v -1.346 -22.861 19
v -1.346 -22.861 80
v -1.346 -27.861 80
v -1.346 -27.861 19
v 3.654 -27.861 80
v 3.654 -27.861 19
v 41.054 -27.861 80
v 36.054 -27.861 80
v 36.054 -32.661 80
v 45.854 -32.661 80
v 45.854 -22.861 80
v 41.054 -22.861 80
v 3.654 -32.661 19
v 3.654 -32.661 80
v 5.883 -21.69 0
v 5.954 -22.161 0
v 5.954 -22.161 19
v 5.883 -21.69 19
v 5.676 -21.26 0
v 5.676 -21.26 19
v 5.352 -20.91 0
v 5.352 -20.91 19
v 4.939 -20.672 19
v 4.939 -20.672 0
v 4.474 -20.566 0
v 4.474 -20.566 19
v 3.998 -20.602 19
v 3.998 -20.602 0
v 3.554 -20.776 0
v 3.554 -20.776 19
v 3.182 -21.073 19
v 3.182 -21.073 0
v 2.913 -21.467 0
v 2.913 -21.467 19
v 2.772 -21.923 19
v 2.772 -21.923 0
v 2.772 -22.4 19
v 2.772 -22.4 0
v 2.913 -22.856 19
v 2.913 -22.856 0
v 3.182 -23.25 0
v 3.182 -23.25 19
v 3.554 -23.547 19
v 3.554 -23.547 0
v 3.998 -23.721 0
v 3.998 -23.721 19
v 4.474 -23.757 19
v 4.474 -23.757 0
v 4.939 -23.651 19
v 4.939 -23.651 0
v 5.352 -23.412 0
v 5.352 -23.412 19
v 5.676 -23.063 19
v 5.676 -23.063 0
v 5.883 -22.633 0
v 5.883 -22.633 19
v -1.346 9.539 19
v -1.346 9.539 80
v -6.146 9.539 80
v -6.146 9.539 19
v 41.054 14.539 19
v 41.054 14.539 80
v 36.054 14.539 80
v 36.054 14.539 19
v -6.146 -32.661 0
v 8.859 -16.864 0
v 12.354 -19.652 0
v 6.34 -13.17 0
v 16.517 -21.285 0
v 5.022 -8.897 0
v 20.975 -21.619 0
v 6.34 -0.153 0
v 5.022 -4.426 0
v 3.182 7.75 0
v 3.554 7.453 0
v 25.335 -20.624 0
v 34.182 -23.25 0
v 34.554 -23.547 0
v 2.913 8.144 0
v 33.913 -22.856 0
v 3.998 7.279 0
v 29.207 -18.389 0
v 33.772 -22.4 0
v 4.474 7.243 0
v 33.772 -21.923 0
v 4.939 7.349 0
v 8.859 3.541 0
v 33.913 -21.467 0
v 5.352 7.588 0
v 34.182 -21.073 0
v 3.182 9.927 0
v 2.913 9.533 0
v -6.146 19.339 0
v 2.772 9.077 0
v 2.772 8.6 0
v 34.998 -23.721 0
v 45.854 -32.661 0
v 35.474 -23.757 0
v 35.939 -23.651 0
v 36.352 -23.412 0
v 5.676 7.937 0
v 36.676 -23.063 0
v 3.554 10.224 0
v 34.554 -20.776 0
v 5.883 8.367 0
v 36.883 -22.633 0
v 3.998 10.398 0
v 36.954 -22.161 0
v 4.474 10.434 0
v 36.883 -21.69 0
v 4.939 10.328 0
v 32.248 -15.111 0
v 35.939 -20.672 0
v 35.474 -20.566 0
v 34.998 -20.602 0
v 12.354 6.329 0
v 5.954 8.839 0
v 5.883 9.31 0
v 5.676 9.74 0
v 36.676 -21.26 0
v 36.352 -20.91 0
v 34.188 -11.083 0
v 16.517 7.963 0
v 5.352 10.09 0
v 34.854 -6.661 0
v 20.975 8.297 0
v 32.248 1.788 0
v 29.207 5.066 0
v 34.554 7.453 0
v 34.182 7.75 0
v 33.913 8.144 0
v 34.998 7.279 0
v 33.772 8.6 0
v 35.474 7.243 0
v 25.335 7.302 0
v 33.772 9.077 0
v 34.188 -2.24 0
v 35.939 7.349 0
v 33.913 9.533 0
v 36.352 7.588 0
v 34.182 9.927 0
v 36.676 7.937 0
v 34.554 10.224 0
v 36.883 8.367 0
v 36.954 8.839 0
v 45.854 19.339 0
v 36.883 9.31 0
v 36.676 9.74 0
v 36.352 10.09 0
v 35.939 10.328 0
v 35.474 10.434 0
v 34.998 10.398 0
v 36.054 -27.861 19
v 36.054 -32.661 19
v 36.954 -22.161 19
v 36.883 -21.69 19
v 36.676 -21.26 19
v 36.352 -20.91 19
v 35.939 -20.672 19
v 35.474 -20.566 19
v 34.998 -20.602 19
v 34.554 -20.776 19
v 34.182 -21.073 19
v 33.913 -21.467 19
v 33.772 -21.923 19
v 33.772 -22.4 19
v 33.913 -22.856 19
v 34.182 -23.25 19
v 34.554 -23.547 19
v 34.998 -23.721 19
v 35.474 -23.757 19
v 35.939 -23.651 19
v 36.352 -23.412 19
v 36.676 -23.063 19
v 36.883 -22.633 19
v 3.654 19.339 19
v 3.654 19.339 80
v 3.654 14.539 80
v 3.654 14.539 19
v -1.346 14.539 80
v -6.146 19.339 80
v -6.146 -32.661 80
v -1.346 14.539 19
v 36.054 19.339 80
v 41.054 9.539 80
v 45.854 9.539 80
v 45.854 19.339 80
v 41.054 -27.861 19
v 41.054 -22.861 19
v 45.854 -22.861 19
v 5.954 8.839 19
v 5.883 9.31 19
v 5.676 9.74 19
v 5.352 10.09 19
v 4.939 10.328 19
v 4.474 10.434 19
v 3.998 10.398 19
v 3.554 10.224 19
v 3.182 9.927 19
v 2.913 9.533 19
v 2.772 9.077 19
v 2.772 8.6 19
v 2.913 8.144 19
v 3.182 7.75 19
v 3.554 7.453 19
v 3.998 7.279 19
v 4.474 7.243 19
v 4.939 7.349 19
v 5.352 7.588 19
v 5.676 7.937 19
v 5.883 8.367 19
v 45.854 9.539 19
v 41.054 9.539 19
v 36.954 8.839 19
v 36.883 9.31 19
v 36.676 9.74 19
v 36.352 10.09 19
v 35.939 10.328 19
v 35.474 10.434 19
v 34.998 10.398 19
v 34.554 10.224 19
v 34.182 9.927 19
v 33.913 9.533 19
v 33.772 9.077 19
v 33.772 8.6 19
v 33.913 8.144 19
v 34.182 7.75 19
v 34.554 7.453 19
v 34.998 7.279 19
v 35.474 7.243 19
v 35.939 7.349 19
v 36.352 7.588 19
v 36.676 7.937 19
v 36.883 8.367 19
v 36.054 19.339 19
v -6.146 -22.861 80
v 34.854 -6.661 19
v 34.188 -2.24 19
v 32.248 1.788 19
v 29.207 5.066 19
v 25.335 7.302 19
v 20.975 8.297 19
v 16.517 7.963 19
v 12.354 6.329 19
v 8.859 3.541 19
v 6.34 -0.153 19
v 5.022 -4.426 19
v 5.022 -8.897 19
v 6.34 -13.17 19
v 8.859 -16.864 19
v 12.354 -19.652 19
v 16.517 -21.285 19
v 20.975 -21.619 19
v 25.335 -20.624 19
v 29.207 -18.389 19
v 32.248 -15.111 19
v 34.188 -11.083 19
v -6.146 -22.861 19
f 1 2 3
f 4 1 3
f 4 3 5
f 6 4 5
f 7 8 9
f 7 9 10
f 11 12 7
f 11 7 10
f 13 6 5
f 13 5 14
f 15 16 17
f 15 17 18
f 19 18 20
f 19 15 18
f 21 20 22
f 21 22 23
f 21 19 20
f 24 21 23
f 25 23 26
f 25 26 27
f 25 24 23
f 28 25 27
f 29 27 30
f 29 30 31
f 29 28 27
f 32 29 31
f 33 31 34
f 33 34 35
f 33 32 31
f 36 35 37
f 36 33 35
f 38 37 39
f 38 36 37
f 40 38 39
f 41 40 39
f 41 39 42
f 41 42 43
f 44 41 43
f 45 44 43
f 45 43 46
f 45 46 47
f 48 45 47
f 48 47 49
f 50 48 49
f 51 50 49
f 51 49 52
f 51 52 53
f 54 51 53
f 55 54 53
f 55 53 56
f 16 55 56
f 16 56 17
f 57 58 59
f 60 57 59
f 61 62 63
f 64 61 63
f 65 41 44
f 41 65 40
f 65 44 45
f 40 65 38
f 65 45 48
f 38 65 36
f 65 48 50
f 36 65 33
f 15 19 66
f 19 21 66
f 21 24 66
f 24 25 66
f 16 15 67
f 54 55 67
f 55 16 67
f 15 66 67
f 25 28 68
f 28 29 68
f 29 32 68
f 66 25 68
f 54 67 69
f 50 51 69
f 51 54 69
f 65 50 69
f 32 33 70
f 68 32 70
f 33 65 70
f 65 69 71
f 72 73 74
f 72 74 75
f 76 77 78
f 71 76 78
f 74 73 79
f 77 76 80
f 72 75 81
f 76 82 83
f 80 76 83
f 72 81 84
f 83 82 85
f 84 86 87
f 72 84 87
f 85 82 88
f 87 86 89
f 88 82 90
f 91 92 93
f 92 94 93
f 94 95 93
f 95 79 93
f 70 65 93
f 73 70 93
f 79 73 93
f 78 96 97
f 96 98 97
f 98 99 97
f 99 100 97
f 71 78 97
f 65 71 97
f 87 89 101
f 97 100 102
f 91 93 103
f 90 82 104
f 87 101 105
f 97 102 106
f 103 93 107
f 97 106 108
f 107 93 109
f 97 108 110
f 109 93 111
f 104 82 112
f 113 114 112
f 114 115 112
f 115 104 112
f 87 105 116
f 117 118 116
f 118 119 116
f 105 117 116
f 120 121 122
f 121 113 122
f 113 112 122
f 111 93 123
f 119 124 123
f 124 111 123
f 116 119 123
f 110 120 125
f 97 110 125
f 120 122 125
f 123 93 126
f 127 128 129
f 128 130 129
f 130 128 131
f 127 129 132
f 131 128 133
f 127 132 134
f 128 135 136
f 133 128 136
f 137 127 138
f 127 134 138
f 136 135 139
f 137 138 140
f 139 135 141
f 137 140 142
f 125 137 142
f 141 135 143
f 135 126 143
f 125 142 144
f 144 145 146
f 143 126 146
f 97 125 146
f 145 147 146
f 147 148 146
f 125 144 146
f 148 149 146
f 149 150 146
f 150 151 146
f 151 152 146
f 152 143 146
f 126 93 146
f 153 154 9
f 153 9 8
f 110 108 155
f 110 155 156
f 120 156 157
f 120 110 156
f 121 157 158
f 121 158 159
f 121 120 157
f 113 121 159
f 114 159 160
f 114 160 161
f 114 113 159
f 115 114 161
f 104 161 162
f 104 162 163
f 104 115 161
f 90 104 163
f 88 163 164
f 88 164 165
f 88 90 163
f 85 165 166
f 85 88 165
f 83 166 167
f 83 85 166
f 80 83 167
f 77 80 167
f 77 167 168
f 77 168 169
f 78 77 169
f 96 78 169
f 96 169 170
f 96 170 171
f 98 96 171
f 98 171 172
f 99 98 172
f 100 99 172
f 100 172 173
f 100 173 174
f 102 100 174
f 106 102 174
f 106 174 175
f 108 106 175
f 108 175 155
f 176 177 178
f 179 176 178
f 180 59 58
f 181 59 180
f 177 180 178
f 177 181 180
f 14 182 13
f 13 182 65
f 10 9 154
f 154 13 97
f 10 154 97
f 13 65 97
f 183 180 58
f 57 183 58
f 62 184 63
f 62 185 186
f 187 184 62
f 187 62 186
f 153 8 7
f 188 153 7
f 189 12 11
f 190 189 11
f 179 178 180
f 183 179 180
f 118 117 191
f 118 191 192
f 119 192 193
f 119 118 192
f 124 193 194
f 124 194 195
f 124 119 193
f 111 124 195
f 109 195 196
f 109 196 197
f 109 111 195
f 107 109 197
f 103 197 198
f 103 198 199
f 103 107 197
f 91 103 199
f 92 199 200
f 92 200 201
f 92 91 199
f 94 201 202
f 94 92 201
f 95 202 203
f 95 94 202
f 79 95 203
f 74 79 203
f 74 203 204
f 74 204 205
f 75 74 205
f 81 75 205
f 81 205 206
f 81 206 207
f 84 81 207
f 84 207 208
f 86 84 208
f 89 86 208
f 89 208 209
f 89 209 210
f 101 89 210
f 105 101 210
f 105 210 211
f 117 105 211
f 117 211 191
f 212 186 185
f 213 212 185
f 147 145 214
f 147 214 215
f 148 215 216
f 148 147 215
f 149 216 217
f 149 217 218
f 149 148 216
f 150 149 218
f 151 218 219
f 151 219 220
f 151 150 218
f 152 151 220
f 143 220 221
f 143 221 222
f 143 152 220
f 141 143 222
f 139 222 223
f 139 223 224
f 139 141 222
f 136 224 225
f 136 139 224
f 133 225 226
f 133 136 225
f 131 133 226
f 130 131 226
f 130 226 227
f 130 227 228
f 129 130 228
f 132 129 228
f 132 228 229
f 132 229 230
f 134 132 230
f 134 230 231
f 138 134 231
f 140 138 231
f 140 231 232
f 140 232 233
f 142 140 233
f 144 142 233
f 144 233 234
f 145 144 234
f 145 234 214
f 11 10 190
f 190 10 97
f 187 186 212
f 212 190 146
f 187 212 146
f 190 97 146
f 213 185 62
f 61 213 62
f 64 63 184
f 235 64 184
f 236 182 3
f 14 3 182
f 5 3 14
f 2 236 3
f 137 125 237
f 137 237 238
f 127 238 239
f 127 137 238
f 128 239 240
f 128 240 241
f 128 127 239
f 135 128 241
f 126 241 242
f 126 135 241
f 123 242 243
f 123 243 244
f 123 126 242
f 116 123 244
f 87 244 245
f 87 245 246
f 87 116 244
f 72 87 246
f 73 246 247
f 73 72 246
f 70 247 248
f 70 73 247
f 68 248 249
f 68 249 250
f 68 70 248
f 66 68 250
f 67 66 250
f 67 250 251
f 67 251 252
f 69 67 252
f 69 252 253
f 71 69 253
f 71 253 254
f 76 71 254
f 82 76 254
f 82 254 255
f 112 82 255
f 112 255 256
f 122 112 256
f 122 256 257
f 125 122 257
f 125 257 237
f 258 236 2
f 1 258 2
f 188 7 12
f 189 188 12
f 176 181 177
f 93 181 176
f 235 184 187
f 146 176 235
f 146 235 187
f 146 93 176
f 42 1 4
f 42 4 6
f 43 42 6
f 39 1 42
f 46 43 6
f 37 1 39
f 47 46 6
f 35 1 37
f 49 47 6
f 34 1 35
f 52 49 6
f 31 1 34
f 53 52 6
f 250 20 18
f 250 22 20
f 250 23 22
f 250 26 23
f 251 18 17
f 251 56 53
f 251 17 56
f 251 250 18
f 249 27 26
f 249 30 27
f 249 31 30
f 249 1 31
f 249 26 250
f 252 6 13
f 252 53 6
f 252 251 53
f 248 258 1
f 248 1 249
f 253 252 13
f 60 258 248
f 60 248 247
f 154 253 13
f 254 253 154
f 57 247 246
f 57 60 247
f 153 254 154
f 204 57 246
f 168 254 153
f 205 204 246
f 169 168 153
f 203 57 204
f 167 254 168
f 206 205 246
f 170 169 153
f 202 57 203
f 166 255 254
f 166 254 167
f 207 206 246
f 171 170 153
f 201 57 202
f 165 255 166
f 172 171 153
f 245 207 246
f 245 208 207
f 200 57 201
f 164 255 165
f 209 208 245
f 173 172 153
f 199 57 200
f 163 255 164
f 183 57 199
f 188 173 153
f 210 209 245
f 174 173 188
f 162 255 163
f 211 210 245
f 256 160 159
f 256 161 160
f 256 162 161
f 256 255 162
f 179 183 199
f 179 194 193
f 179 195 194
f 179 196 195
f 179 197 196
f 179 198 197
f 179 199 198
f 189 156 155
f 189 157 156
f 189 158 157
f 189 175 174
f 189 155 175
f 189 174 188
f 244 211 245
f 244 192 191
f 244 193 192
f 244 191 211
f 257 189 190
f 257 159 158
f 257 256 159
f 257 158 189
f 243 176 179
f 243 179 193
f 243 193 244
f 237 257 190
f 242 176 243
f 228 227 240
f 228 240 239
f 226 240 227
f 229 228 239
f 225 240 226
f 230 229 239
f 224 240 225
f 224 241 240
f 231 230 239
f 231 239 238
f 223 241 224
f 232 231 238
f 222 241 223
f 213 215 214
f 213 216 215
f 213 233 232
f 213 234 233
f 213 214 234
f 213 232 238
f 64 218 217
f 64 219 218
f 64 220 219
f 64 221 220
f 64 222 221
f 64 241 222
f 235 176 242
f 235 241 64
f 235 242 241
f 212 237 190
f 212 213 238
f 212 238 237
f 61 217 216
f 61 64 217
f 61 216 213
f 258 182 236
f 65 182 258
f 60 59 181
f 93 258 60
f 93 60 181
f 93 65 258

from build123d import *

# Parameters (mm, degrees)
SKETCH_1_W          = 52
SKETCH_1_H          = 52
SKETCH_1_R          = 15
SKETCH_1_R_2        = 1.6
EXTRUDE_1_DEPTH     = 80
SKETCH_2_R          = 1.6
SKETCH_2_R_2        = 15
CUT_EXTRUDE_1_DEPTH = 61


with BuildPart() as part:
    # 草图1 → 凸台-拉伸1 (new body)
    with BuildSketch(Plane.XY):
        with Locations((19.85443038, -6.661392405)):
            Rectangle(SKETCH_1_W, SKETCH_1_H)
        with Locations((19.85443038, -6.661392405)):
            Circle(SKETCH_1_R, mode=Mode.SUBTRACT)
        with Locations((35.35443038, 8.838607595)):
            Circle(SKETCH_1_R_2, mode=Mode.SUBTRACT)
        with Locations((35.35443038, -22.161392405)):
            Circle(SKETCH_1_R_2, mode=Mode.SUBTRACT)
        with Locations((4.35443038, -22.161392405)):
            Circle(SKETCH_1_R_2, mode=Mode.SUBTRACT)
        with Locations((4.35443038, 8.838607595)):
            Circle(SKETCH_1_R_2, mode=Mode.SUBTRACT)
    extrude(amount=EXTRUDE_1_DEPTH)

    # 草图2 → 切除-拉伸1 (cut)
    with BuildSketch(Plane.XY.offset(80)):
        Polygon((3.65443038, 14.538607595), (-1.34556962, 14.538607595), (-1.34556962, 9.538607595), (-6.14556962, 9.538607595), (-6.14556962, -22.861392405), (-1.34556962, -22.861392405), (-1.34556962, -27.861392405), (3.65443038, -27.861392405), (3.65443038, -32.661392405), (36.05443038, -32.661392405), (36.05443038, -27.861392405), (41.05443038, -27.861392405), (41.05443038, -22.861392405), (45.85443038, -22.861392405), (45.85443038, 9.538607595), (41.05443038, 9.538607595), (41.05443038, 14.538607595), (36.05443038, 14.538607595), (36.05443038, 19.338607595), (3.65443038, 19.338607595), align=None)
        with Locations((4.35443038, -22.161392405)):
            Circle(SKETCH_2_R, mode=Mode.SUBTRACT)
        with Locations((35.35443038, -22.161392405)):
            Circle(SKETCH_2_R, mode=Mode.SUBTRACT)
        with Locations((4.35443038, 8.838607595)):
            Circle(SKETCH_2_R, mode=Mode.SUBTRACT)
        with Locations((19.85443038, -6.661392405)):
            Circle(SKETCH_2_R_2, mode=Mode.SUBTRACT)
        with Locations((35.35443038, 8.838607595)):
            Circle(SKETCH_2_R, mode=Mode.SUBTRACT)
    extrude(amount=-CUT_EXTRUDE_1_DEPTH, mode=Mode.SUBTRACT)


solid = part.part
